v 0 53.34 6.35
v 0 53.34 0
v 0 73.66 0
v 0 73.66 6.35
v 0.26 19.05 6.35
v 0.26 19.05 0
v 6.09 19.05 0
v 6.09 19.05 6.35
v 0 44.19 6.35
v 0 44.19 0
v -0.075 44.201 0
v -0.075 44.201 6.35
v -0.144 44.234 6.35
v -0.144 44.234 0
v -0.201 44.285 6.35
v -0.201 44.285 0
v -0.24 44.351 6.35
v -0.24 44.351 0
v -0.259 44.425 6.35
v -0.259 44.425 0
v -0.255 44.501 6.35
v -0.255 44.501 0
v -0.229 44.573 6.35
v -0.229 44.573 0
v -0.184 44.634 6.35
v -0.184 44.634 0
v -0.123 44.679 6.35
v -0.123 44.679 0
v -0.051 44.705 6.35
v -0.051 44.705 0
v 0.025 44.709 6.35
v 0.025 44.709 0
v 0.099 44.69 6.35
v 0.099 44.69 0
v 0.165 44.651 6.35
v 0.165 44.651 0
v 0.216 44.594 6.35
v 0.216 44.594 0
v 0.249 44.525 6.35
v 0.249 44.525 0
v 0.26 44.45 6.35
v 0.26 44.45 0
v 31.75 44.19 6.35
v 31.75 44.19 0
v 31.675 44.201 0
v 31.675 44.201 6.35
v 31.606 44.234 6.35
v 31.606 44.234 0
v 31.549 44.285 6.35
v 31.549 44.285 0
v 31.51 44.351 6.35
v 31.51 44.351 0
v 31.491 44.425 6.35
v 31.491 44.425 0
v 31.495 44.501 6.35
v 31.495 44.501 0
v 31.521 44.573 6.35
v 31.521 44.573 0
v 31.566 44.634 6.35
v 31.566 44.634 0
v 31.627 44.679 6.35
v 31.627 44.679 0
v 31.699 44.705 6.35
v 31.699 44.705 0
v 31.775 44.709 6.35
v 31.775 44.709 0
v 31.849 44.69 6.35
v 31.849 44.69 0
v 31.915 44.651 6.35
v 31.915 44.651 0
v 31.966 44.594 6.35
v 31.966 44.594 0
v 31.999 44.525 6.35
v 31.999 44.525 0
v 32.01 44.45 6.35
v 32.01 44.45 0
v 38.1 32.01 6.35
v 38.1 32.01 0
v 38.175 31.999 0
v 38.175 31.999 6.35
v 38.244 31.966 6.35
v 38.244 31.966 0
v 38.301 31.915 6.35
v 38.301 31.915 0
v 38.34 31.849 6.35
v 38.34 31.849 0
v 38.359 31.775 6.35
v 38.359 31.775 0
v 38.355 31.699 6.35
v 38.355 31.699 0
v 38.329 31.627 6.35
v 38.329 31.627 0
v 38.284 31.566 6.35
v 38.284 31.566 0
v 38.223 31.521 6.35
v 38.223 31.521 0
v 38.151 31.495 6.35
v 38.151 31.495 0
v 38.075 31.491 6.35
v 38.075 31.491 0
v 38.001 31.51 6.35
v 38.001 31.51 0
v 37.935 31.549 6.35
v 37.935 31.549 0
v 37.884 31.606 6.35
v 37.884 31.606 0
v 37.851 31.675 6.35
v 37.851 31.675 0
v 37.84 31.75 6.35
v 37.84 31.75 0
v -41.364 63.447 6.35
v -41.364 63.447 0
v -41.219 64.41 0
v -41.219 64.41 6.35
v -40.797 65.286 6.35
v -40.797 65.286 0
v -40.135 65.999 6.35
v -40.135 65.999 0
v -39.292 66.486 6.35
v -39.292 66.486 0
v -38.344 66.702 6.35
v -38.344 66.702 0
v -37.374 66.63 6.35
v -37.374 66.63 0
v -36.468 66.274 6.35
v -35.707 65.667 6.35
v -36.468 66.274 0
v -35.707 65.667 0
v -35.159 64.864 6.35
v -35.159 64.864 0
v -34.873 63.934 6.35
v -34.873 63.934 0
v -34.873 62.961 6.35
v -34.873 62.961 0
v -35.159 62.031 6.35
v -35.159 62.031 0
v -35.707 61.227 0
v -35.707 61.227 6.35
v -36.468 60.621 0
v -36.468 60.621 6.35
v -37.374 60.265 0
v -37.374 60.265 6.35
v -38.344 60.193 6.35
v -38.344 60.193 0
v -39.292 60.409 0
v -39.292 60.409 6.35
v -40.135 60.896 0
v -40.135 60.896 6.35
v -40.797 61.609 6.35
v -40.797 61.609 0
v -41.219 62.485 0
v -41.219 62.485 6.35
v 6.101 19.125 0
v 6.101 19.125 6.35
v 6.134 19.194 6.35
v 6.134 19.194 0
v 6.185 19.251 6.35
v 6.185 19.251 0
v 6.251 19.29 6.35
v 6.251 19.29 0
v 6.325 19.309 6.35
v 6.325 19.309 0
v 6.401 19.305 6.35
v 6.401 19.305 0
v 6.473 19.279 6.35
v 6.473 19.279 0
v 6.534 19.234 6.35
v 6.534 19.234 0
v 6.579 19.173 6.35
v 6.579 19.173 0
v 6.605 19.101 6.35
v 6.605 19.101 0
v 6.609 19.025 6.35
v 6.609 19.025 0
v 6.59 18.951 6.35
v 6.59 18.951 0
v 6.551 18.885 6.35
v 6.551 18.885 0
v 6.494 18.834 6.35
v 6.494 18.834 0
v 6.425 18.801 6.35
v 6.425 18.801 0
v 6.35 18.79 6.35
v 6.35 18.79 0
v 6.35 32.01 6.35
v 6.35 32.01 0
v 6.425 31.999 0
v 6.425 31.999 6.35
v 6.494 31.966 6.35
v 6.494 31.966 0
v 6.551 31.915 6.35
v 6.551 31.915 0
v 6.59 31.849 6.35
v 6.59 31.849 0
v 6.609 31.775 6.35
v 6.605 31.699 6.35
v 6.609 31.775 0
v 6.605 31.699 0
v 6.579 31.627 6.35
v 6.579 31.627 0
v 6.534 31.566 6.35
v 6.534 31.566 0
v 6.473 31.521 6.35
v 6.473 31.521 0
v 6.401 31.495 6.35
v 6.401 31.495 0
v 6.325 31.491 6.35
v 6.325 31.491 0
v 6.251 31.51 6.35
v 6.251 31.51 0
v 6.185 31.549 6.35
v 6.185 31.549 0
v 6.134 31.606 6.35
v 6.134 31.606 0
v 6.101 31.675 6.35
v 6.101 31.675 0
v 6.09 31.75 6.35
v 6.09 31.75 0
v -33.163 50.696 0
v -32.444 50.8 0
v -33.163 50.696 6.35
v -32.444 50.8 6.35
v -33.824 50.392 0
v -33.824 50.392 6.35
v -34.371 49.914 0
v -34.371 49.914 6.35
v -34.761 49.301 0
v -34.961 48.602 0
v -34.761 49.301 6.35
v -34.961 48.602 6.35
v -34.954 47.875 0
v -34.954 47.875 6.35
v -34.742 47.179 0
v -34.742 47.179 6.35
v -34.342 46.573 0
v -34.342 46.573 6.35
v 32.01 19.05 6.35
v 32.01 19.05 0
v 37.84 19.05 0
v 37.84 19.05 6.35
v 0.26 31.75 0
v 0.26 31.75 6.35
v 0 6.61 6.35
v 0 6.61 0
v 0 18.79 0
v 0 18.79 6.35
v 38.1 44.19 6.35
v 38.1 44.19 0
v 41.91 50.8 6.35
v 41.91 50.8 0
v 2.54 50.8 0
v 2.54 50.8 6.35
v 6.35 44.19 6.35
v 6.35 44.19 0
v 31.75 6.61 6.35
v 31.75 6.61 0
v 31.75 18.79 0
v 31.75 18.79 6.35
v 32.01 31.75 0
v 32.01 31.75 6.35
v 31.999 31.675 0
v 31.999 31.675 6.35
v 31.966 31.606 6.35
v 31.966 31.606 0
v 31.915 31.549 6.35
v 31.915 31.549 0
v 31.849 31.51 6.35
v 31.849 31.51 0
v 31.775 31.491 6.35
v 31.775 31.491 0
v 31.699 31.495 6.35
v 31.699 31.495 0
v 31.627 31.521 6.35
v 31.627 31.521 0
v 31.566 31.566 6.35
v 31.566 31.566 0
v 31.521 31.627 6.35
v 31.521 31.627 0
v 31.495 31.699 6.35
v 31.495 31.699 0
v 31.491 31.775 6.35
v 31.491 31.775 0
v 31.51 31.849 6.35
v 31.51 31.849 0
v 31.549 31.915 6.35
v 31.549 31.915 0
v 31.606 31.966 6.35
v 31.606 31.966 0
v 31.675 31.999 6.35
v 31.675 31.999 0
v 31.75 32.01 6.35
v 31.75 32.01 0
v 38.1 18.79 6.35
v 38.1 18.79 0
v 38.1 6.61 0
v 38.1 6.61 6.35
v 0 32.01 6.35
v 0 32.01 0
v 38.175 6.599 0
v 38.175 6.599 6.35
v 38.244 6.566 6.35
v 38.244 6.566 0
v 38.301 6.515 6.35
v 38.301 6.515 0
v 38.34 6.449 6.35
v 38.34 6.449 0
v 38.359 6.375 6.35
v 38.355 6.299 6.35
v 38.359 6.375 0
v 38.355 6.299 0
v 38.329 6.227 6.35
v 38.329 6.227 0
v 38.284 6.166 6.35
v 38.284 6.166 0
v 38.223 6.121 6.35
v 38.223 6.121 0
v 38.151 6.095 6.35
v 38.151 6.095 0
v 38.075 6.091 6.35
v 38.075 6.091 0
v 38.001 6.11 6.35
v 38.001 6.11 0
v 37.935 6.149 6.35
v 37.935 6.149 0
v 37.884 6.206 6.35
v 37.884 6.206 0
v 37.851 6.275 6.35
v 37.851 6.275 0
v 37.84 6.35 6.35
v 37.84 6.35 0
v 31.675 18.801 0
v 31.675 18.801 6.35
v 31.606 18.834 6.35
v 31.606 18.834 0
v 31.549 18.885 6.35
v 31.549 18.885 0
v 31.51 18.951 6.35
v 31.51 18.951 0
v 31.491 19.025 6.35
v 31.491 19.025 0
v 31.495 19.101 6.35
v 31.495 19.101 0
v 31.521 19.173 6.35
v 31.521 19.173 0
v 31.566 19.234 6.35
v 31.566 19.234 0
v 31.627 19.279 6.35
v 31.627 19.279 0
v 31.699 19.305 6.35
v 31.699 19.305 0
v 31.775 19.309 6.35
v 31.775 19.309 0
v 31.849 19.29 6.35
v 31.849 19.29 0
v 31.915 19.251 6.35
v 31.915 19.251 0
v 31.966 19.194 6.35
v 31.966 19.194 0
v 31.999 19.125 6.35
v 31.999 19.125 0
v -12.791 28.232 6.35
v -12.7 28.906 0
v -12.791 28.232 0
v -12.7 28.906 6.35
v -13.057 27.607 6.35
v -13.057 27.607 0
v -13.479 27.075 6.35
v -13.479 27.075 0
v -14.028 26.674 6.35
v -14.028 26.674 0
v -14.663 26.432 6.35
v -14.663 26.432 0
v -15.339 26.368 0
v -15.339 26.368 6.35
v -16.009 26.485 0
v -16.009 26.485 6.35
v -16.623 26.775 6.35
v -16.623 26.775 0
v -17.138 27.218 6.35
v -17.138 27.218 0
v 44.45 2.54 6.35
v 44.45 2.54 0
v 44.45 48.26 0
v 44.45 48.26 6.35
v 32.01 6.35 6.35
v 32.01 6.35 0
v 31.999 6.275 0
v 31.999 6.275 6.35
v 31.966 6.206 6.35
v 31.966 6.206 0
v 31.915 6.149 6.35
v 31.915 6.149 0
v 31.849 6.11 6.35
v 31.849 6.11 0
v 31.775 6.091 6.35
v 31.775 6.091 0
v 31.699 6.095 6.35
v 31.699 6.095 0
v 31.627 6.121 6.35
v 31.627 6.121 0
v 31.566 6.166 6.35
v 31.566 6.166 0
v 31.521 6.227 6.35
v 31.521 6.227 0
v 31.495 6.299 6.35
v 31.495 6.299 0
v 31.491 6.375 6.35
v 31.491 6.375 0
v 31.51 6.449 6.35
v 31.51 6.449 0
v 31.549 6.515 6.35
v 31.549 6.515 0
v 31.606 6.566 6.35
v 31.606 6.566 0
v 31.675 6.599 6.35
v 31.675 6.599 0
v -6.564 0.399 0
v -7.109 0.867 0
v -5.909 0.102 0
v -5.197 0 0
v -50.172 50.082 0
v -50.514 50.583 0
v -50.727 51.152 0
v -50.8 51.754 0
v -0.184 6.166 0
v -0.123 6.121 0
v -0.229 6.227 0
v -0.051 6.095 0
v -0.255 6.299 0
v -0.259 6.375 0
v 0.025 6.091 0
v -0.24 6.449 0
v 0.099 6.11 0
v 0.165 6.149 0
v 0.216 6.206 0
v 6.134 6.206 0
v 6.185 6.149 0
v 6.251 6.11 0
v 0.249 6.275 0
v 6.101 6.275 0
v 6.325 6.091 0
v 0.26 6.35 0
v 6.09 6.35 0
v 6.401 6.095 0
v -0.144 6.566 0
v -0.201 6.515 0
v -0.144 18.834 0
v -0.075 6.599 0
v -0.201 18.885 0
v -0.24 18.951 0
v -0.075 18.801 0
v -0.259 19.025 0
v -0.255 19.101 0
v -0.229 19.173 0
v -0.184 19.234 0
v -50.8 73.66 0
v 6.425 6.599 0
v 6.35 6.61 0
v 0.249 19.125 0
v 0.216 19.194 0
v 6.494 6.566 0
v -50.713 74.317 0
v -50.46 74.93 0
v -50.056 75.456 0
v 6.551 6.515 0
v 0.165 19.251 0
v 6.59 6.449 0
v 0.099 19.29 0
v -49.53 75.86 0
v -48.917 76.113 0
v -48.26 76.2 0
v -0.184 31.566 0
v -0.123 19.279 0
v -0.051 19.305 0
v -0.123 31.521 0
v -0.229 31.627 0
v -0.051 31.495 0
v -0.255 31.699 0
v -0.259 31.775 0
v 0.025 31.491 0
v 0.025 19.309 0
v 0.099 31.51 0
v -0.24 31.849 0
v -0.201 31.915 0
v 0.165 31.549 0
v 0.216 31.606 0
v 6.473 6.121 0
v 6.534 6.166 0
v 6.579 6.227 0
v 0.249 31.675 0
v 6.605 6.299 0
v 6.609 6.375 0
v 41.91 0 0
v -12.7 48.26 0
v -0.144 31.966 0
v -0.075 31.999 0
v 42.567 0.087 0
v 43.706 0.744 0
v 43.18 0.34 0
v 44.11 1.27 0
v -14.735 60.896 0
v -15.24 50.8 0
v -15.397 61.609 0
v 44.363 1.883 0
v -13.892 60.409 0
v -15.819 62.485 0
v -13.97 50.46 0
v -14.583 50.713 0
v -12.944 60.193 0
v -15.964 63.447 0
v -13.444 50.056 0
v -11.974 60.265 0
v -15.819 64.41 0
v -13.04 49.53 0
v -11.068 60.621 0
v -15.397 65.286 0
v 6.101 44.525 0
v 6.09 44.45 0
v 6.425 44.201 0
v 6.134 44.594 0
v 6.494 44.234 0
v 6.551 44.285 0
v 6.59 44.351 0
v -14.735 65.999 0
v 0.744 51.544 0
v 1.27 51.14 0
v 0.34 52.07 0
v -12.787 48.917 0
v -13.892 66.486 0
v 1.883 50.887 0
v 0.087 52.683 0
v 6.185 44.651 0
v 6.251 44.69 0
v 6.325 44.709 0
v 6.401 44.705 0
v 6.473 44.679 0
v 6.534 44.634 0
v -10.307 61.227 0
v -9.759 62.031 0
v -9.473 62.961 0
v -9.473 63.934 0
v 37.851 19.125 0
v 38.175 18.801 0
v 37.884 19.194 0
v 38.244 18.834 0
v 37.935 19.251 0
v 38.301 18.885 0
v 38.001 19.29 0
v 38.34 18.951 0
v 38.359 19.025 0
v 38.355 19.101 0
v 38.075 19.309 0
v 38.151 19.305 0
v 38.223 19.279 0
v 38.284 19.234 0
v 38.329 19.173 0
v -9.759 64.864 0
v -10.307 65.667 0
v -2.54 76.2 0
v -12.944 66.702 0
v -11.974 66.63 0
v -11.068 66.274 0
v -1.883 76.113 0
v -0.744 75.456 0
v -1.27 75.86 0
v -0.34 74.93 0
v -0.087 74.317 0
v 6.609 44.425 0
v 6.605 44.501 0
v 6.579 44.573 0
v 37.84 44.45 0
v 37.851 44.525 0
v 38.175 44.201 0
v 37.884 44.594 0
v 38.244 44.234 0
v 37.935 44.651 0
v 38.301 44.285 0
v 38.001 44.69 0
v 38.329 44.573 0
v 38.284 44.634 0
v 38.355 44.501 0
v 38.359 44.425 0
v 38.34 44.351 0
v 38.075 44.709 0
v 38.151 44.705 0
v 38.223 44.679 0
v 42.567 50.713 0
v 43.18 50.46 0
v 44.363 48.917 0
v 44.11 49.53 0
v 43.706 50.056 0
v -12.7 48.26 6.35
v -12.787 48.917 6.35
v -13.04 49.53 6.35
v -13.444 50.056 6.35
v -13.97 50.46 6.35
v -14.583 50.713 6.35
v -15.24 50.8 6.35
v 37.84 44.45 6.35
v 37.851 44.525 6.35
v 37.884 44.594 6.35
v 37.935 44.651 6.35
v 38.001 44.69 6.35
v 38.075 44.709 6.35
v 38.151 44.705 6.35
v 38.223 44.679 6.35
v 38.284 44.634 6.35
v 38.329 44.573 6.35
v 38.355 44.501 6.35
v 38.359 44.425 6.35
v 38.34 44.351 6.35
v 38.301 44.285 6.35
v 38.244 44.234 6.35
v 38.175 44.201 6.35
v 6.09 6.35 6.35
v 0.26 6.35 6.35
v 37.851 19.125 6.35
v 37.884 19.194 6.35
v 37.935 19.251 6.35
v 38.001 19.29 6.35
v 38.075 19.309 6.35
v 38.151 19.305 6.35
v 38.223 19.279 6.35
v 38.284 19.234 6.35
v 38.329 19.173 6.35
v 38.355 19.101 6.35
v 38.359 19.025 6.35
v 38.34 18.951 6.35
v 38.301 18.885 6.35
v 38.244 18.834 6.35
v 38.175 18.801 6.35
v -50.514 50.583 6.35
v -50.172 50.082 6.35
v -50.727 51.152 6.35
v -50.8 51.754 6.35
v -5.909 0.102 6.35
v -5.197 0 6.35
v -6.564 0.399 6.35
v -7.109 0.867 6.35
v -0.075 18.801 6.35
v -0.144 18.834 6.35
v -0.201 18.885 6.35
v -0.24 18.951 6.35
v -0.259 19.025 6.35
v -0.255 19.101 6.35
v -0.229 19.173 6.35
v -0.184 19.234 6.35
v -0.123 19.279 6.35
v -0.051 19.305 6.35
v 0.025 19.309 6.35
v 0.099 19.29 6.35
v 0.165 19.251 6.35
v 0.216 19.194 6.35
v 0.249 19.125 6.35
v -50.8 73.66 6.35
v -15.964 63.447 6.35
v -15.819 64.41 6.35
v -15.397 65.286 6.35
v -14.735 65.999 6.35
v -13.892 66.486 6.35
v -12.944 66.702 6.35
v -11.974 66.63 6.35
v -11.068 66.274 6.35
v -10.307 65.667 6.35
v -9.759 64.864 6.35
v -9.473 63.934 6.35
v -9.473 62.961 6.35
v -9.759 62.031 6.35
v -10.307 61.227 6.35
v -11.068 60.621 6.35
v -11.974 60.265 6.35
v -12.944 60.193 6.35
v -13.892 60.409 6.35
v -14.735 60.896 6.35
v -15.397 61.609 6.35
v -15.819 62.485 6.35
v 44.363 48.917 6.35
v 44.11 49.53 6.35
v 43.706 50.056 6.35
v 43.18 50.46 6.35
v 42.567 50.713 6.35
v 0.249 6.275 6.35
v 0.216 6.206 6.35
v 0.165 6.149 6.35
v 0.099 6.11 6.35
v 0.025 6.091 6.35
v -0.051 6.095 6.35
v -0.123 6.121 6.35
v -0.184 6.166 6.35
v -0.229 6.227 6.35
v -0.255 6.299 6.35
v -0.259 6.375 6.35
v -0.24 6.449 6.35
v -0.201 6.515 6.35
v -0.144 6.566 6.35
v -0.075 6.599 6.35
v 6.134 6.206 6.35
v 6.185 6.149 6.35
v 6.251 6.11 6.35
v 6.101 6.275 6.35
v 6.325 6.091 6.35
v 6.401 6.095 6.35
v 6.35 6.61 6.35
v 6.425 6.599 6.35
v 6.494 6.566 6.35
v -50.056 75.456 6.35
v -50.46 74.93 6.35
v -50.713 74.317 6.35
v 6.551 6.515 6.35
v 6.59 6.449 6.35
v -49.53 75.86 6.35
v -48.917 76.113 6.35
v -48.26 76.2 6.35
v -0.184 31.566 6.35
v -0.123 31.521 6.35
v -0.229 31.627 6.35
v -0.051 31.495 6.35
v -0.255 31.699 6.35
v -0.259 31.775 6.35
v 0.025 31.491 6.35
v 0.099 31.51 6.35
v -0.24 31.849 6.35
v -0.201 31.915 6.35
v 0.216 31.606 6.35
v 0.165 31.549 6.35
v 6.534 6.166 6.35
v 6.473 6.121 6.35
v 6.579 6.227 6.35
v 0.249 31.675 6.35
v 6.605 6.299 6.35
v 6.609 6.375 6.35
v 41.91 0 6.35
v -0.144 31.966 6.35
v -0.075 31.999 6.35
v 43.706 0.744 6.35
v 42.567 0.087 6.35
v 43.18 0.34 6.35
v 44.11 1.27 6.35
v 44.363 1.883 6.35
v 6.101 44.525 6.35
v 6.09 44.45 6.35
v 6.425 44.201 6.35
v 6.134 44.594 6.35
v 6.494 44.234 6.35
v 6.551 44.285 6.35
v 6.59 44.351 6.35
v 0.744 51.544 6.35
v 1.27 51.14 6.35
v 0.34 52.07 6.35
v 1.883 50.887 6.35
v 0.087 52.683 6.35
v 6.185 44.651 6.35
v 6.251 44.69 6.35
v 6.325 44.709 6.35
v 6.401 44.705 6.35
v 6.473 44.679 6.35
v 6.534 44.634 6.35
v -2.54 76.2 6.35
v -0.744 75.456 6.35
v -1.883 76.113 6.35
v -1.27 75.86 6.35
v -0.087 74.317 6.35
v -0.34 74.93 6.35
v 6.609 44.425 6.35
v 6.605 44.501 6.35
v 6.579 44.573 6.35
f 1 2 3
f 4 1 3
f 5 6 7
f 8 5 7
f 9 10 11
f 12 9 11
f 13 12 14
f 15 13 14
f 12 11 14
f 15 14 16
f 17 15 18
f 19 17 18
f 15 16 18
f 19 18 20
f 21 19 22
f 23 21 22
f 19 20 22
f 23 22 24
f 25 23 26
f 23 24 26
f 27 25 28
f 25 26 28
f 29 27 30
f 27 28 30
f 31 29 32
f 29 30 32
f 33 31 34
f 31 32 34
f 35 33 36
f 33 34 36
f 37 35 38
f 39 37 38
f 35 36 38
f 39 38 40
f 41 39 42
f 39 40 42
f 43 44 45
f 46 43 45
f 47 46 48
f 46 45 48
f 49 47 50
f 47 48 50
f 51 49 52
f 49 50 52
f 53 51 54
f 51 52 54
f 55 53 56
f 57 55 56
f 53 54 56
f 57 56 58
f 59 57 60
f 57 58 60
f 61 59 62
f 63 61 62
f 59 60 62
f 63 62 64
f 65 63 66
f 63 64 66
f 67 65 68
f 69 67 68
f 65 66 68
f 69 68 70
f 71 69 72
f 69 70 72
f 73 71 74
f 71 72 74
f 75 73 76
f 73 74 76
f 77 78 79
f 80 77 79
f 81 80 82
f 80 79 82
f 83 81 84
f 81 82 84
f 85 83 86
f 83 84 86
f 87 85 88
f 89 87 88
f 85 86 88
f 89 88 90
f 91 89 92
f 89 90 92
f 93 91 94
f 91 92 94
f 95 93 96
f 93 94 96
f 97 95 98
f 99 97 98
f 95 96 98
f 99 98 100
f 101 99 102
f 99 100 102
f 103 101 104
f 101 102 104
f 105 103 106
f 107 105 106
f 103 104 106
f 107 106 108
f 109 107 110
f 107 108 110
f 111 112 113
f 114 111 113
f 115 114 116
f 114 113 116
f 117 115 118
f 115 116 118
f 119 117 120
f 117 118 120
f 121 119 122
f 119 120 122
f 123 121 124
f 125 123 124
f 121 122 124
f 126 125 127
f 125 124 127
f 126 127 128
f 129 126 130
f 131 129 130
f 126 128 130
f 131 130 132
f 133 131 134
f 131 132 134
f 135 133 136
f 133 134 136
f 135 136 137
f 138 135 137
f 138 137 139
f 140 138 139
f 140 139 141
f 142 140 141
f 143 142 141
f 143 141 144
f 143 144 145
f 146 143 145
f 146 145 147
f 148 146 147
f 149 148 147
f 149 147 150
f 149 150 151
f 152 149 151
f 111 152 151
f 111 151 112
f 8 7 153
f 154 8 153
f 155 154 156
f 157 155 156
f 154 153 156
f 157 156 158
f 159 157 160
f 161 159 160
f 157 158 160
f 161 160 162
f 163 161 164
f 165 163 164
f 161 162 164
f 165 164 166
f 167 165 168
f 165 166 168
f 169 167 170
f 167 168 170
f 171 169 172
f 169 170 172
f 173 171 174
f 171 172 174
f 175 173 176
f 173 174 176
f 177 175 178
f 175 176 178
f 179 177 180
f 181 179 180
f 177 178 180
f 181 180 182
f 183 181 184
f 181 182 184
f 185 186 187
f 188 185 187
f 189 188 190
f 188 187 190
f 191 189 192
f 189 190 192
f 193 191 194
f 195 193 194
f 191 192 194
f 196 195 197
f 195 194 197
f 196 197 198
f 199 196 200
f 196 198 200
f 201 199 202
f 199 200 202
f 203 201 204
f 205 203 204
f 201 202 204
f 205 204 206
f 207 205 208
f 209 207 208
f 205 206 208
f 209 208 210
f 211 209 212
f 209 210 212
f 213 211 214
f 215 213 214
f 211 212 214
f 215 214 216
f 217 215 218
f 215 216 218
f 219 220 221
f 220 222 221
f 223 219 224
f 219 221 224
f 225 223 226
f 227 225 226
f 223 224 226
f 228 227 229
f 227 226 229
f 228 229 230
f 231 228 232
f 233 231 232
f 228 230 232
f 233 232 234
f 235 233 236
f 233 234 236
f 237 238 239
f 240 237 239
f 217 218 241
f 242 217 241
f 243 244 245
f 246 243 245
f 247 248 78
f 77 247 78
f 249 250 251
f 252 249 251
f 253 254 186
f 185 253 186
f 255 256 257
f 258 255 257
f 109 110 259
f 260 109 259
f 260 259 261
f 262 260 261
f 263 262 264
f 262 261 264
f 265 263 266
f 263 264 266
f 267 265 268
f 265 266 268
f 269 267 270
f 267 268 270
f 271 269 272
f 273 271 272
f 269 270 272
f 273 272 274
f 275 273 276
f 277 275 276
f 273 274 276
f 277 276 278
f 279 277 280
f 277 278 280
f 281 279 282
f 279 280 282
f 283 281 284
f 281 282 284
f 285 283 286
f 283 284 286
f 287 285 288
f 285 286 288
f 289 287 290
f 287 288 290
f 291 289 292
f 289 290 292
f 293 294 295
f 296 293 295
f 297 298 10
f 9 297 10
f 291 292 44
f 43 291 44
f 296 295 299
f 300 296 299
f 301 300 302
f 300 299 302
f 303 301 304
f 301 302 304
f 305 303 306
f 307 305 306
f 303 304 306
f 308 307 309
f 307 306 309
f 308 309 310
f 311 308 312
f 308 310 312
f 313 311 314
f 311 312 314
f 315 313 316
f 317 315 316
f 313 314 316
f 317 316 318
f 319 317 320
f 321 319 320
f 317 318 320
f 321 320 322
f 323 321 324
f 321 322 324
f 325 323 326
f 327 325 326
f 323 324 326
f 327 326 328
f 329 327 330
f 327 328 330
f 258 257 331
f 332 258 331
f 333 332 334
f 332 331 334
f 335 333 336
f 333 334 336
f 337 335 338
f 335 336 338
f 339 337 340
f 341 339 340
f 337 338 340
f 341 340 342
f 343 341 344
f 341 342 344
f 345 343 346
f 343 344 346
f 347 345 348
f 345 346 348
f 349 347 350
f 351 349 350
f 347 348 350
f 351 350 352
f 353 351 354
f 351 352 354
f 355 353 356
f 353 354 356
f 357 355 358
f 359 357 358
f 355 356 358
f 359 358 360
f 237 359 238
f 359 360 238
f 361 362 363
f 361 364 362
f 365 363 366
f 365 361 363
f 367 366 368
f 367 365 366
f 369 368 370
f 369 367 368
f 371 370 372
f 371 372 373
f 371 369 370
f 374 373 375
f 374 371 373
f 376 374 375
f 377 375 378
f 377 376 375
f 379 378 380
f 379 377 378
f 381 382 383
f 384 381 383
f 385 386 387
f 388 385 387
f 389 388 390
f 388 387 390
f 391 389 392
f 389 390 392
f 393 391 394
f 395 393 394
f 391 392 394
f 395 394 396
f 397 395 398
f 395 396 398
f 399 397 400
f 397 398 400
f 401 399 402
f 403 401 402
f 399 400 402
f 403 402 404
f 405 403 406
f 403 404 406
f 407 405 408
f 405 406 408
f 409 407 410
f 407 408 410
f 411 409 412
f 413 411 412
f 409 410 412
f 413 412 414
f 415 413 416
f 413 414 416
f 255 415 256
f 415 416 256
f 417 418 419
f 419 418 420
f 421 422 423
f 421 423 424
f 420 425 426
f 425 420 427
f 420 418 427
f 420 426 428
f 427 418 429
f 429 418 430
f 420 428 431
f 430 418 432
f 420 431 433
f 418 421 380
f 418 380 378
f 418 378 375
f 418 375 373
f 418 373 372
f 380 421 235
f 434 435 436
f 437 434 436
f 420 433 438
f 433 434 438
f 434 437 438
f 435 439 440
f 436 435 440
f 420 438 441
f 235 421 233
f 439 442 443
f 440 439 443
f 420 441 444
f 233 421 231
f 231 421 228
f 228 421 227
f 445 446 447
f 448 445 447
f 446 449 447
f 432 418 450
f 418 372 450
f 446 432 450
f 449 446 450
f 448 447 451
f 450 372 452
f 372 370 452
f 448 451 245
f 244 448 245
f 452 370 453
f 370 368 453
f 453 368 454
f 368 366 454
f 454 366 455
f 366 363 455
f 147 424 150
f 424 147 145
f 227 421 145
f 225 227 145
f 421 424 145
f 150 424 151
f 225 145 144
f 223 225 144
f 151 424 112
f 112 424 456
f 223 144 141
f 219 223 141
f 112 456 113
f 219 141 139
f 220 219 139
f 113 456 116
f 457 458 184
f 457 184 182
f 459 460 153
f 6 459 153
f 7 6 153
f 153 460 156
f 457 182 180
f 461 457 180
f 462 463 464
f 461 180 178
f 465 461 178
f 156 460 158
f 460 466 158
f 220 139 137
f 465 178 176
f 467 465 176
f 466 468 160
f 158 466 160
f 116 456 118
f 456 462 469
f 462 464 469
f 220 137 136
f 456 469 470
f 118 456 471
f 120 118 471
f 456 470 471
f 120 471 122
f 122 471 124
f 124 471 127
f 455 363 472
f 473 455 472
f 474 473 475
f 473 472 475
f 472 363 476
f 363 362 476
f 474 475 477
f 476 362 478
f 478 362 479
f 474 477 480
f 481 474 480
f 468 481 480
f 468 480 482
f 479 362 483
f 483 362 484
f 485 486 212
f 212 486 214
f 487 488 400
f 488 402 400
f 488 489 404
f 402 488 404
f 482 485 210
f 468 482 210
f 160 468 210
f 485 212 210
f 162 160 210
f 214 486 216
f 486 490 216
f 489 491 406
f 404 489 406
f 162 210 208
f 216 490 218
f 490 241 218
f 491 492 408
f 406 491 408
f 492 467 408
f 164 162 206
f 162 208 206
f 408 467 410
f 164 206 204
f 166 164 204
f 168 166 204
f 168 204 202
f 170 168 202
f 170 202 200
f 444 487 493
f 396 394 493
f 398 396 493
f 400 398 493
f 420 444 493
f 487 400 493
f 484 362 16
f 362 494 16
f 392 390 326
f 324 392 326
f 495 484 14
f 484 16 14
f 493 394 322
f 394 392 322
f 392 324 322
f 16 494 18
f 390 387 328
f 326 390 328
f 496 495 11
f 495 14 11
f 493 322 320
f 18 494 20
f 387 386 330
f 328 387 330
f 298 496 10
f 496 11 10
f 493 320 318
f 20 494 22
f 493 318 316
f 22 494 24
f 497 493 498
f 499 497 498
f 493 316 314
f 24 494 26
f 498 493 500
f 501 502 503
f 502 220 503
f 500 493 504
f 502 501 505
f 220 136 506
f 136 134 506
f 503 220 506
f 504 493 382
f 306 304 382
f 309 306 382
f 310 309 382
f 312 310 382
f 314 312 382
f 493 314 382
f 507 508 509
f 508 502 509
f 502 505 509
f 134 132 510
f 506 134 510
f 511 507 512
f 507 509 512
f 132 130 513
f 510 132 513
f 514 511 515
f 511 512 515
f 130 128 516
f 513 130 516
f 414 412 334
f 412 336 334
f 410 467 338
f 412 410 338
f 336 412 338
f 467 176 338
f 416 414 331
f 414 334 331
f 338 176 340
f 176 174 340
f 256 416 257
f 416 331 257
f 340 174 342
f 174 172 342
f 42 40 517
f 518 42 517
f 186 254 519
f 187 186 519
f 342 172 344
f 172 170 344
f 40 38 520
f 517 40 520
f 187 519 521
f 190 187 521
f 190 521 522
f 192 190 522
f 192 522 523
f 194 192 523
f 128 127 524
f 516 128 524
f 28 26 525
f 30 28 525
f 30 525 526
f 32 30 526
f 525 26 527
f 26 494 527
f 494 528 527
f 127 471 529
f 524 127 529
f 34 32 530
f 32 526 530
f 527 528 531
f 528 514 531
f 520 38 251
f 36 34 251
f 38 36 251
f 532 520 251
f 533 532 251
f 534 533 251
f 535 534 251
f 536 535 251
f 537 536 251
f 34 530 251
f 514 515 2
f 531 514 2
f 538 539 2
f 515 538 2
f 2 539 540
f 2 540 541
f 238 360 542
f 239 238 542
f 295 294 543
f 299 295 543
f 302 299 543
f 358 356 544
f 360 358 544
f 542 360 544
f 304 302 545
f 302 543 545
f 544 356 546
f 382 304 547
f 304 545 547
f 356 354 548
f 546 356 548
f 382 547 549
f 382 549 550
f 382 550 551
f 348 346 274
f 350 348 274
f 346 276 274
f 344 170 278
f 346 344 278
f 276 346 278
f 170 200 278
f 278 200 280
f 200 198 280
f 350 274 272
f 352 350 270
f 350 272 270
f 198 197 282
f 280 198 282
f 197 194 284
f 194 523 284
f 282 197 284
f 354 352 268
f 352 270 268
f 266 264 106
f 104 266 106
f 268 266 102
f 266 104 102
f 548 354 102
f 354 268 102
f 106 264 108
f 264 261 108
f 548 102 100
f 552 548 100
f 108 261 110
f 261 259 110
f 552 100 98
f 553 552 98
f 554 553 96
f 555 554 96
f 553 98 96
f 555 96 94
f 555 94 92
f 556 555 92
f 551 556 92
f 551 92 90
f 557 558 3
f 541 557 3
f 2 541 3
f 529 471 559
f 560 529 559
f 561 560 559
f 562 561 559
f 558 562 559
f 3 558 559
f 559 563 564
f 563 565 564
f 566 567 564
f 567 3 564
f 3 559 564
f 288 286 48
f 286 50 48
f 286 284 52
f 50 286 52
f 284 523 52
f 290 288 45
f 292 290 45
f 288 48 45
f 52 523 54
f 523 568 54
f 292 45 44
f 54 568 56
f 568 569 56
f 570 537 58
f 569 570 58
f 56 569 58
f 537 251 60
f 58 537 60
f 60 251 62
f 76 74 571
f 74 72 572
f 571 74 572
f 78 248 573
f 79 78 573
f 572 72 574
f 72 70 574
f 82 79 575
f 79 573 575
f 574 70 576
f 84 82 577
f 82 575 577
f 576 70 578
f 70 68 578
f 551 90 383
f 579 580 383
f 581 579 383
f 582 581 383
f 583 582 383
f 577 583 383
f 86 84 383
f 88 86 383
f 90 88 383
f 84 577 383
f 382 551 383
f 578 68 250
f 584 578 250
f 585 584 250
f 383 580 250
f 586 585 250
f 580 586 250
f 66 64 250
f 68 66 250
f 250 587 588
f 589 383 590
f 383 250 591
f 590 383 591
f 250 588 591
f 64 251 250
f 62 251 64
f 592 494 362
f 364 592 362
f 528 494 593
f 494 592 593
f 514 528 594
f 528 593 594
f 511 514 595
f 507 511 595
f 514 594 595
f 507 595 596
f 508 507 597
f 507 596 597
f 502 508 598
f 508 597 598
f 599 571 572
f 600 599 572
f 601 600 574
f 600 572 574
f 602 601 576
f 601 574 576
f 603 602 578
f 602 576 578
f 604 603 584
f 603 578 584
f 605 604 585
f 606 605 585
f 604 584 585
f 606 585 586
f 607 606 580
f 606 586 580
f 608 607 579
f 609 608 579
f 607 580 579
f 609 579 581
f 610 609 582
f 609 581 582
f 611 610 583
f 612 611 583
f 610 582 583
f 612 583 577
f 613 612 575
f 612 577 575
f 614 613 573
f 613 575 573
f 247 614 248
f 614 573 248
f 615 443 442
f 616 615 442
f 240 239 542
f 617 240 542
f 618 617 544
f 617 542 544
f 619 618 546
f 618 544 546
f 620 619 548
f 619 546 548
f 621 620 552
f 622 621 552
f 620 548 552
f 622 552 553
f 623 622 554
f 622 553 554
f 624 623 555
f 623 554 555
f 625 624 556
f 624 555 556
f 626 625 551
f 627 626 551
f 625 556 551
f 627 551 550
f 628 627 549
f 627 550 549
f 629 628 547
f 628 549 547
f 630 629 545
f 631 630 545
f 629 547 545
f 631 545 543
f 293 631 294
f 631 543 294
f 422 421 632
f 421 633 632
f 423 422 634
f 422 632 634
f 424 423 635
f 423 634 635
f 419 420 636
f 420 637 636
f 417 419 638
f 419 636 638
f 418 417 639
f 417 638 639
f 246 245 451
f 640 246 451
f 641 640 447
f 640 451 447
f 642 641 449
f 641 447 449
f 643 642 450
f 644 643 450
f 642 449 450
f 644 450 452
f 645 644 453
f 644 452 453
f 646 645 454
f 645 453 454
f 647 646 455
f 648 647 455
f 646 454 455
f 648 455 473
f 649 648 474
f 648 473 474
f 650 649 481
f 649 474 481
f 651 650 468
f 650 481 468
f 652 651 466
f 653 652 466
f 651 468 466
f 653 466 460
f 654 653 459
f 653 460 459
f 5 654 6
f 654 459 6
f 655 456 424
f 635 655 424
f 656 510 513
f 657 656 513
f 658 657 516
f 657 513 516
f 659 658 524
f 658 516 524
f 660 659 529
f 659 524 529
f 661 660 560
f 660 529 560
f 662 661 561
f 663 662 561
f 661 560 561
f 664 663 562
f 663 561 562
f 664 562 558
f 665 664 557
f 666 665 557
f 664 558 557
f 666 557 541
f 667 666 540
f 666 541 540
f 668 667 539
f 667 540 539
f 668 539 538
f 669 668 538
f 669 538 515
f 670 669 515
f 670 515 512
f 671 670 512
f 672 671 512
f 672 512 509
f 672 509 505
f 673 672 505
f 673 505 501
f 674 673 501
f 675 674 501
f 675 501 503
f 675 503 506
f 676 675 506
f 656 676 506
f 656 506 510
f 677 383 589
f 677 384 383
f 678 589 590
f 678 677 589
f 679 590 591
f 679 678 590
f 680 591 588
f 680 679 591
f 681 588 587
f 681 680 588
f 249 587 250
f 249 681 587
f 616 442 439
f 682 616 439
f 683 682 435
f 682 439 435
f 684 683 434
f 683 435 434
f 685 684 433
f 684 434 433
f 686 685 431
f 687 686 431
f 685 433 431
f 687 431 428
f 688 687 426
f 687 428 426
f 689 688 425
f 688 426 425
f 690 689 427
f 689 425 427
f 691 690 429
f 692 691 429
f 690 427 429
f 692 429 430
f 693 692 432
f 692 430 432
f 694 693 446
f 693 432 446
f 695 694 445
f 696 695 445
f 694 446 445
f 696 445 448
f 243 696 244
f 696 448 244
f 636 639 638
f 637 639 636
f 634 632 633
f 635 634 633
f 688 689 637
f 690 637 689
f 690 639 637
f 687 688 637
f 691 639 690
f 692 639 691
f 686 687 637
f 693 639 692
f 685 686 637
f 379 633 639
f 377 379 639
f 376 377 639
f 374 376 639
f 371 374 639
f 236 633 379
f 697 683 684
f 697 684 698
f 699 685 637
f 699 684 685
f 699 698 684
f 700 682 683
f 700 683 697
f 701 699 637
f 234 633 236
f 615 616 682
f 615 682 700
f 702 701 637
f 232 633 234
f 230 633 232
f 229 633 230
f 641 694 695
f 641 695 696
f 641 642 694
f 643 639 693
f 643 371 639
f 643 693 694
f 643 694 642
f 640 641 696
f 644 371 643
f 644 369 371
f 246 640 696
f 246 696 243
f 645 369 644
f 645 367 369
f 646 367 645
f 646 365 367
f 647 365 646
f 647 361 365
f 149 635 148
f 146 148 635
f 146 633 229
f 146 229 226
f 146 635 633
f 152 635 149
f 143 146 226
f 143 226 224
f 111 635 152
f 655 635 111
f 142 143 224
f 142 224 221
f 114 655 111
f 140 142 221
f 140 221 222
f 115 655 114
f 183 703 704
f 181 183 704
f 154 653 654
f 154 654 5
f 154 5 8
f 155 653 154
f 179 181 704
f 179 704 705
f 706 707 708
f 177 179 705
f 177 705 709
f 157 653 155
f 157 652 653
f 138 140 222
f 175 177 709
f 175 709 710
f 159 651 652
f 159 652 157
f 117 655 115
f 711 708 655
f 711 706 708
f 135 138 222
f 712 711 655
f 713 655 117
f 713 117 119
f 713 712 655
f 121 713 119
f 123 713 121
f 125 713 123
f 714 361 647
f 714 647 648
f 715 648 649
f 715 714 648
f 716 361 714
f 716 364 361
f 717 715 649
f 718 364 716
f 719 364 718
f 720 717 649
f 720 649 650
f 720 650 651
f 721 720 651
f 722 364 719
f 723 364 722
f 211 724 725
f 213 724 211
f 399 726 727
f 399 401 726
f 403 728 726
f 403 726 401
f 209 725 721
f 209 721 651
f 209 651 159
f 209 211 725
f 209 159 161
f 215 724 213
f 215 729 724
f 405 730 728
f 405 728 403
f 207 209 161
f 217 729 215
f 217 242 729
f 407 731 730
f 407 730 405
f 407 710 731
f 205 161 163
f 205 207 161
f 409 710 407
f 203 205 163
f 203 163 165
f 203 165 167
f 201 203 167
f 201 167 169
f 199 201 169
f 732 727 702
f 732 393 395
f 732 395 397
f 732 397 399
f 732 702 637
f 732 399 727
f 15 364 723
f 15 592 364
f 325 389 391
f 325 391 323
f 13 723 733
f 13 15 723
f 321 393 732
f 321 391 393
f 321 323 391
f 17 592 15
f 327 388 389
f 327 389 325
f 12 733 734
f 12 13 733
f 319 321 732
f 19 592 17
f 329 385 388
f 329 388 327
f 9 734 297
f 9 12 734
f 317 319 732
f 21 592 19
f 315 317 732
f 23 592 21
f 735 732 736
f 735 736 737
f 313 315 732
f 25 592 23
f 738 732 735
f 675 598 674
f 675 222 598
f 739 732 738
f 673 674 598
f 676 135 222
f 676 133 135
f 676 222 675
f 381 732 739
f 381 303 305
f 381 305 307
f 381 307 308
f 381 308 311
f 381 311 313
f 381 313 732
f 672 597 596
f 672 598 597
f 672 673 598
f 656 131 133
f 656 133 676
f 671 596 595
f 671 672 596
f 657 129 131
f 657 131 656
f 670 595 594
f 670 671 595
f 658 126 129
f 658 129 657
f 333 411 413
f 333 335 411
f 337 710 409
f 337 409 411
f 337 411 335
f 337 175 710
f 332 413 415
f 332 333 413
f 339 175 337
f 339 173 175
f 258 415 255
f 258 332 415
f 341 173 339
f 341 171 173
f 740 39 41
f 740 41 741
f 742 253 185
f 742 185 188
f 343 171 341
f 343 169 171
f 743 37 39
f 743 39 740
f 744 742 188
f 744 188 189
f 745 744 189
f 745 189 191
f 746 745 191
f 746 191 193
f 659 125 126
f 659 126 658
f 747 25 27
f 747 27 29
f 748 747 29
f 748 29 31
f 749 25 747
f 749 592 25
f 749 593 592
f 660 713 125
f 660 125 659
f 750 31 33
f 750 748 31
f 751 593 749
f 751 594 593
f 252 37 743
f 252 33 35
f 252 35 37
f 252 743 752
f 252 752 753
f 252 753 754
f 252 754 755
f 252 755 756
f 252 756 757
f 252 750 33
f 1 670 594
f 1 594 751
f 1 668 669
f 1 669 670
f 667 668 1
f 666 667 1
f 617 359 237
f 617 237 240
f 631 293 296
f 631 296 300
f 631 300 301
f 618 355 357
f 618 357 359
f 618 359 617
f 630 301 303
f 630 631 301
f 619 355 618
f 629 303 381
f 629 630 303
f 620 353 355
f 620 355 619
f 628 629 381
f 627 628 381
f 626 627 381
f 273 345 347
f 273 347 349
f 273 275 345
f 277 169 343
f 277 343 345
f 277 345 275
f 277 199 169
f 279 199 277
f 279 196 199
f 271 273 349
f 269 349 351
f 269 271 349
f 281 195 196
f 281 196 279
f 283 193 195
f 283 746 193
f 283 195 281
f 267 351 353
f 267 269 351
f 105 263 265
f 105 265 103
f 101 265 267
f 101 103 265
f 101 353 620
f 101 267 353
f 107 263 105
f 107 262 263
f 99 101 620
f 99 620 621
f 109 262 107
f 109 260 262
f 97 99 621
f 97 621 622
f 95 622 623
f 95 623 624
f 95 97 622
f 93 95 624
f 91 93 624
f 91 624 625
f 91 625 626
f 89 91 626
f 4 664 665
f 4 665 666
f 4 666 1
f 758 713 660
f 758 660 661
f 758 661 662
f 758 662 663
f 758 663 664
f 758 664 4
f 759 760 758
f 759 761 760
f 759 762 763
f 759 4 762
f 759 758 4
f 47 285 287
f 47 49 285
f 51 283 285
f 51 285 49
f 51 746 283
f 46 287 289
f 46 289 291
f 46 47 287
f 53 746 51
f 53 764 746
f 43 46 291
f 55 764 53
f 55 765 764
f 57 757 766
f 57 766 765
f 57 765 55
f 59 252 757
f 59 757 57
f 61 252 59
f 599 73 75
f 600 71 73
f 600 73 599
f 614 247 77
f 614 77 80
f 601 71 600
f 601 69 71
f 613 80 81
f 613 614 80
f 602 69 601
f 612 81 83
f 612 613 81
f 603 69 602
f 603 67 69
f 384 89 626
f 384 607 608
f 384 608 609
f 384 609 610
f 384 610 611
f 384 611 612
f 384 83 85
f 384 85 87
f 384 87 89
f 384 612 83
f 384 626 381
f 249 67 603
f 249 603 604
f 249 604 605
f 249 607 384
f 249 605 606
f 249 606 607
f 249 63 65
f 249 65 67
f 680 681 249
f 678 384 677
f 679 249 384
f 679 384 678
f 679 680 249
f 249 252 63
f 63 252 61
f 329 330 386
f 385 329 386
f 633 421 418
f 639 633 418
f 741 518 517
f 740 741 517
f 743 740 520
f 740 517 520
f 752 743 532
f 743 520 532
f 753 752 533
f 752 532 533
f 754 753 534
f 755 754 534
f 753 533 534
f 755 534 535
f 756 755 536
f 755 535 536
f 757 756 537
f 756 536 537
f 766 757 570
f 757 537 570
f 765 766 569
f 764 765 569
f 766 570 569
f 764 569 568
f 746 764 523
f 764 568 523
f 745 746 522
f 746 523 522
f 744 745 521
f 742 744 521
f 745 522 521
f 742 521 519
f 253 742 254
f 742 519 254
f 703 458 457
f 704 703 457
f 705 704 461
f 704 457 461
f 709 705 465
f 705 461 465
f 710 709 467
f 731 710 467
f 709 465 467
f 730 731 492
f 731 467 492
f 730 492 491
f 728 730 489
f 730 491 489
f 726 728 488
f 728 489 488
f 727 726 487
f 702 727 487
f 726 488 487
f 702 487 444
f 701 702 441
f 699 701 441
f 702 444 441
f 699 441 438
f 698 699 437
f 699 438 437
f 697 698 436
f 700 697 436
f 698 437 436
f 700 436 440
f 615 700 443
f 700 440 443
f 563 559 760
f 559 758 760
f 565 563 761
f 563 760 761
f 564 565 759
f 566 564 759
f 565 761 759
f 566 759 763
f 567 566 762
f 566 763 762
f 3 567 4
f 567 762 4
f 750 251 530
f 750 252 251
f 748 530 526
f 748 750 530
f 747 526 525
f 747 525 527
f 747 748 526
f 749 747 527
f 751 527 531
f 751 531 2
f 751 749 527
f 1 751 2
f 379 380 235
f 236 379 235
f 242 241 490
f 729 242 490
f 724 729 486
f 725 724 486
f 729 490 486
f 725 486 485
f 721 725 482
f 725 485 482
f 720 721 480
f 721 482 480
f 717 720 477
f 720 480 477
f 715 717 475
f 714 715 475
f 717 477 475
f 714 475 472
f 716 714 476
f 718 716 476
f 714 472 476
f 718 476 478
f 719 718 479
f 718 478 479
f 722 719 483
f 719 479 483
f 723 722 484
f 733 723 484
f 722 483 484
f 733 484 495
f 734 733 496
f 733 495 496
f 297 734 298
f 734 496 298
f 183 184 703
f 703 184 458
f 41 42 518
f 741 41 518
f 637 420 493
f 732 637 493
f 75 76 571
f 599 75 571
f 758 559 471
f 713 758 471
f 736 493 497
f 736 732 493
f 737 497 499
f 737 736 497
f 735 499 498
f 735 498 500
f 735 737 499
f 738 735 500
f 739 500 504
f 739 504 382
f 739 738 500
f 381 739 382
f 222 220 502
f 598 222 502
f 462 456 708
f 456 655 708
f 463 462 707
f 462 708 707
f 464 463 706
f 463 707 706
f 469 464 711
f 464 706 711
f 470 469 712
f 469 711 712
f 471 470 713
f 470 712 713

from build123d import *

# Parameters (mm, degrees)
BOSS_EXTRUDE1_DEPTH      = 6.35
FILLET1_R                = 2.54
FILLET2_R                = 2.54
F_0_257_DIAMETER_HOLE1_D = 6.5278


with BuildPart() as part:
    # Sketch1 → Boss-Extrude1 (new body)
    with BuildSketch(Plane.XY):
        Polygon((-6.35, 0), (0, 0), (44.45, 0), (44.45, 32.01), (44.45, 44.19), (44.45, 50.8), (0, 50.8), (0, 76.2), (-50.8, 76.2), (-50.8, 50.8), align=None)
        Polygon((-12.7, 22.225), (-38.1, 50.8), (-12.7, 50.8), align=None, mode=Mode.SUBTRACT)
        with BuildLine():
            ThreePointArc((0.26, 6.35), (-0.183847763, 6.166152237), (0, 6.61))
            Line((0, 6.61), (0, 18.79))
            ThreePointArc((0, 18.79), (-0.183847763, 19.233847763), (0.26, 19.05))
            Line((0.26, 19.05), (6.09, 19.05))
            ThreePointArc((6.09, 19.05), (6.533847763, 19.233847763), (6.35, 18.79))
            Line((6.35, 18.79), (6.35, 6.61))
            ThreePointArc((6.35, 6.61), (6.533847763, 6.166152237), (6.09, 6.35))
            Line((6.09, 6.35), (0.26, 6.35))
        make_face(mode=Mode.SUBTRACT)
        with BuildLine():
            Line((31.75, 6.61), (31.75, 18.79))
            ThreePointArc((31.75, 18.79), (31.566152237, 19.233847763), (32.01, 19.05))
            Line((32.01, 19.05), (37.84, 19.05))
            ThreePointArc((37.84, 19.05), (38.283847763, 19.233847763), (38.1, 18.79))
            Line((38.1, 18.79), (38.1, 6.61))
            ThreePointArc((38.1, 6.61), (38.283847763, 6.166152237), (37.84, 6.35))
            Line((37.84, 6.35), (32.01, 6.35))
            ThreePointArc((32.01, 6.35), (31.566152237, 6.166152237), (31.75, 6.61))
        make_face(mode=Mode.SUBTRACT)
        with BuildLine():
            ThreePointArc((0, 44.19), (-0.183847763, 44.633847763), (0.26, 44.45))
            Line((0.26, 44.45), (6.09, 44.45))
            ThreePointArc((6.09, 44.45), (6.533847763, 44.633847763), (6.35, 44.19))
            Line((6.35, 44.19), (6.35, 32.01))
            ThreePointArc((6.35, 32.01), (6.533847763, 31.566152237), (6.09, 31.75))
            Line((6.09, 31.75), (0.26, 31.75))
            ThreePointArc((0.26, 31.75), (-0.183847763, 31.566152237), (0, 32.01))
            Line((0, 32.01), (0, 44.19))
        make_face(mode=Mode.SUBTRACT)
        with BuildLine():
            Line((38.1, 44.19), (38.1, 32.01))
            ThreePointArc((38.1, 32.01), (38.283847763, 31.566152237), (37.84, 31.75))
            Line((37.84, 31.75), (32.01, 31.75))
            ThreePointArc((32.01, 31.75), (31.566152237, 31.566152237), (31.75, 32.01))
            Line((31.75, 32.01), (31.75, 44.19))
            ThreePointArc((31.75, 44.19), (31.566152237, 44.633847763), (32.01, 44.45))
            Line((32.01, 44.45), (37.84, 44.45))
            ThreePointArc((37.84, 44.45), (38.283847763, 44.633847763), (38.1, 44.19))
        make_face(mode=Mode.SUBTRACT)
    extrude(amount=BOSS_EXTRUDE1_DEPTH)

    # Fillet1
    fillet1_edges = [part.edges().sort_by_distance(p)[0] for p in [
        (44.45, 0, 3.175),
        (-6.35, 0, 3.175),
        (-50.8, 50.8, 3.175),
        (-50.8, 76.2, 3.175),
        (0, 76.2, 3.175),
        (0, 50.8, 3.175),
        (44.45, 50.8, 3.175),
    ]]
    fillet(fillet1_edges, radius=FILLET1_R)

    # Fillet2
    fillet2_edges = [part.edges().sort_by_distance(p)[0] for p in [
        (-12.7, 22.225, 3.175),
        (-12.7, 50.8, 3.175),
        (-38.1, 50.8, 3.175),
    ]]
    fillet(fillet2_edges, radius=FILLET2_R)

    # F (0.257) Diameter Hole1 (through all)
    with Locations(Plane.XY.offset(6.35)):
        with Locations((-38.1, 63.44747919), (-12.7, 63.44747919)):
            Hole(F_0_257_DIAMETER_HOLE1_D / 2)


solid = part.part
